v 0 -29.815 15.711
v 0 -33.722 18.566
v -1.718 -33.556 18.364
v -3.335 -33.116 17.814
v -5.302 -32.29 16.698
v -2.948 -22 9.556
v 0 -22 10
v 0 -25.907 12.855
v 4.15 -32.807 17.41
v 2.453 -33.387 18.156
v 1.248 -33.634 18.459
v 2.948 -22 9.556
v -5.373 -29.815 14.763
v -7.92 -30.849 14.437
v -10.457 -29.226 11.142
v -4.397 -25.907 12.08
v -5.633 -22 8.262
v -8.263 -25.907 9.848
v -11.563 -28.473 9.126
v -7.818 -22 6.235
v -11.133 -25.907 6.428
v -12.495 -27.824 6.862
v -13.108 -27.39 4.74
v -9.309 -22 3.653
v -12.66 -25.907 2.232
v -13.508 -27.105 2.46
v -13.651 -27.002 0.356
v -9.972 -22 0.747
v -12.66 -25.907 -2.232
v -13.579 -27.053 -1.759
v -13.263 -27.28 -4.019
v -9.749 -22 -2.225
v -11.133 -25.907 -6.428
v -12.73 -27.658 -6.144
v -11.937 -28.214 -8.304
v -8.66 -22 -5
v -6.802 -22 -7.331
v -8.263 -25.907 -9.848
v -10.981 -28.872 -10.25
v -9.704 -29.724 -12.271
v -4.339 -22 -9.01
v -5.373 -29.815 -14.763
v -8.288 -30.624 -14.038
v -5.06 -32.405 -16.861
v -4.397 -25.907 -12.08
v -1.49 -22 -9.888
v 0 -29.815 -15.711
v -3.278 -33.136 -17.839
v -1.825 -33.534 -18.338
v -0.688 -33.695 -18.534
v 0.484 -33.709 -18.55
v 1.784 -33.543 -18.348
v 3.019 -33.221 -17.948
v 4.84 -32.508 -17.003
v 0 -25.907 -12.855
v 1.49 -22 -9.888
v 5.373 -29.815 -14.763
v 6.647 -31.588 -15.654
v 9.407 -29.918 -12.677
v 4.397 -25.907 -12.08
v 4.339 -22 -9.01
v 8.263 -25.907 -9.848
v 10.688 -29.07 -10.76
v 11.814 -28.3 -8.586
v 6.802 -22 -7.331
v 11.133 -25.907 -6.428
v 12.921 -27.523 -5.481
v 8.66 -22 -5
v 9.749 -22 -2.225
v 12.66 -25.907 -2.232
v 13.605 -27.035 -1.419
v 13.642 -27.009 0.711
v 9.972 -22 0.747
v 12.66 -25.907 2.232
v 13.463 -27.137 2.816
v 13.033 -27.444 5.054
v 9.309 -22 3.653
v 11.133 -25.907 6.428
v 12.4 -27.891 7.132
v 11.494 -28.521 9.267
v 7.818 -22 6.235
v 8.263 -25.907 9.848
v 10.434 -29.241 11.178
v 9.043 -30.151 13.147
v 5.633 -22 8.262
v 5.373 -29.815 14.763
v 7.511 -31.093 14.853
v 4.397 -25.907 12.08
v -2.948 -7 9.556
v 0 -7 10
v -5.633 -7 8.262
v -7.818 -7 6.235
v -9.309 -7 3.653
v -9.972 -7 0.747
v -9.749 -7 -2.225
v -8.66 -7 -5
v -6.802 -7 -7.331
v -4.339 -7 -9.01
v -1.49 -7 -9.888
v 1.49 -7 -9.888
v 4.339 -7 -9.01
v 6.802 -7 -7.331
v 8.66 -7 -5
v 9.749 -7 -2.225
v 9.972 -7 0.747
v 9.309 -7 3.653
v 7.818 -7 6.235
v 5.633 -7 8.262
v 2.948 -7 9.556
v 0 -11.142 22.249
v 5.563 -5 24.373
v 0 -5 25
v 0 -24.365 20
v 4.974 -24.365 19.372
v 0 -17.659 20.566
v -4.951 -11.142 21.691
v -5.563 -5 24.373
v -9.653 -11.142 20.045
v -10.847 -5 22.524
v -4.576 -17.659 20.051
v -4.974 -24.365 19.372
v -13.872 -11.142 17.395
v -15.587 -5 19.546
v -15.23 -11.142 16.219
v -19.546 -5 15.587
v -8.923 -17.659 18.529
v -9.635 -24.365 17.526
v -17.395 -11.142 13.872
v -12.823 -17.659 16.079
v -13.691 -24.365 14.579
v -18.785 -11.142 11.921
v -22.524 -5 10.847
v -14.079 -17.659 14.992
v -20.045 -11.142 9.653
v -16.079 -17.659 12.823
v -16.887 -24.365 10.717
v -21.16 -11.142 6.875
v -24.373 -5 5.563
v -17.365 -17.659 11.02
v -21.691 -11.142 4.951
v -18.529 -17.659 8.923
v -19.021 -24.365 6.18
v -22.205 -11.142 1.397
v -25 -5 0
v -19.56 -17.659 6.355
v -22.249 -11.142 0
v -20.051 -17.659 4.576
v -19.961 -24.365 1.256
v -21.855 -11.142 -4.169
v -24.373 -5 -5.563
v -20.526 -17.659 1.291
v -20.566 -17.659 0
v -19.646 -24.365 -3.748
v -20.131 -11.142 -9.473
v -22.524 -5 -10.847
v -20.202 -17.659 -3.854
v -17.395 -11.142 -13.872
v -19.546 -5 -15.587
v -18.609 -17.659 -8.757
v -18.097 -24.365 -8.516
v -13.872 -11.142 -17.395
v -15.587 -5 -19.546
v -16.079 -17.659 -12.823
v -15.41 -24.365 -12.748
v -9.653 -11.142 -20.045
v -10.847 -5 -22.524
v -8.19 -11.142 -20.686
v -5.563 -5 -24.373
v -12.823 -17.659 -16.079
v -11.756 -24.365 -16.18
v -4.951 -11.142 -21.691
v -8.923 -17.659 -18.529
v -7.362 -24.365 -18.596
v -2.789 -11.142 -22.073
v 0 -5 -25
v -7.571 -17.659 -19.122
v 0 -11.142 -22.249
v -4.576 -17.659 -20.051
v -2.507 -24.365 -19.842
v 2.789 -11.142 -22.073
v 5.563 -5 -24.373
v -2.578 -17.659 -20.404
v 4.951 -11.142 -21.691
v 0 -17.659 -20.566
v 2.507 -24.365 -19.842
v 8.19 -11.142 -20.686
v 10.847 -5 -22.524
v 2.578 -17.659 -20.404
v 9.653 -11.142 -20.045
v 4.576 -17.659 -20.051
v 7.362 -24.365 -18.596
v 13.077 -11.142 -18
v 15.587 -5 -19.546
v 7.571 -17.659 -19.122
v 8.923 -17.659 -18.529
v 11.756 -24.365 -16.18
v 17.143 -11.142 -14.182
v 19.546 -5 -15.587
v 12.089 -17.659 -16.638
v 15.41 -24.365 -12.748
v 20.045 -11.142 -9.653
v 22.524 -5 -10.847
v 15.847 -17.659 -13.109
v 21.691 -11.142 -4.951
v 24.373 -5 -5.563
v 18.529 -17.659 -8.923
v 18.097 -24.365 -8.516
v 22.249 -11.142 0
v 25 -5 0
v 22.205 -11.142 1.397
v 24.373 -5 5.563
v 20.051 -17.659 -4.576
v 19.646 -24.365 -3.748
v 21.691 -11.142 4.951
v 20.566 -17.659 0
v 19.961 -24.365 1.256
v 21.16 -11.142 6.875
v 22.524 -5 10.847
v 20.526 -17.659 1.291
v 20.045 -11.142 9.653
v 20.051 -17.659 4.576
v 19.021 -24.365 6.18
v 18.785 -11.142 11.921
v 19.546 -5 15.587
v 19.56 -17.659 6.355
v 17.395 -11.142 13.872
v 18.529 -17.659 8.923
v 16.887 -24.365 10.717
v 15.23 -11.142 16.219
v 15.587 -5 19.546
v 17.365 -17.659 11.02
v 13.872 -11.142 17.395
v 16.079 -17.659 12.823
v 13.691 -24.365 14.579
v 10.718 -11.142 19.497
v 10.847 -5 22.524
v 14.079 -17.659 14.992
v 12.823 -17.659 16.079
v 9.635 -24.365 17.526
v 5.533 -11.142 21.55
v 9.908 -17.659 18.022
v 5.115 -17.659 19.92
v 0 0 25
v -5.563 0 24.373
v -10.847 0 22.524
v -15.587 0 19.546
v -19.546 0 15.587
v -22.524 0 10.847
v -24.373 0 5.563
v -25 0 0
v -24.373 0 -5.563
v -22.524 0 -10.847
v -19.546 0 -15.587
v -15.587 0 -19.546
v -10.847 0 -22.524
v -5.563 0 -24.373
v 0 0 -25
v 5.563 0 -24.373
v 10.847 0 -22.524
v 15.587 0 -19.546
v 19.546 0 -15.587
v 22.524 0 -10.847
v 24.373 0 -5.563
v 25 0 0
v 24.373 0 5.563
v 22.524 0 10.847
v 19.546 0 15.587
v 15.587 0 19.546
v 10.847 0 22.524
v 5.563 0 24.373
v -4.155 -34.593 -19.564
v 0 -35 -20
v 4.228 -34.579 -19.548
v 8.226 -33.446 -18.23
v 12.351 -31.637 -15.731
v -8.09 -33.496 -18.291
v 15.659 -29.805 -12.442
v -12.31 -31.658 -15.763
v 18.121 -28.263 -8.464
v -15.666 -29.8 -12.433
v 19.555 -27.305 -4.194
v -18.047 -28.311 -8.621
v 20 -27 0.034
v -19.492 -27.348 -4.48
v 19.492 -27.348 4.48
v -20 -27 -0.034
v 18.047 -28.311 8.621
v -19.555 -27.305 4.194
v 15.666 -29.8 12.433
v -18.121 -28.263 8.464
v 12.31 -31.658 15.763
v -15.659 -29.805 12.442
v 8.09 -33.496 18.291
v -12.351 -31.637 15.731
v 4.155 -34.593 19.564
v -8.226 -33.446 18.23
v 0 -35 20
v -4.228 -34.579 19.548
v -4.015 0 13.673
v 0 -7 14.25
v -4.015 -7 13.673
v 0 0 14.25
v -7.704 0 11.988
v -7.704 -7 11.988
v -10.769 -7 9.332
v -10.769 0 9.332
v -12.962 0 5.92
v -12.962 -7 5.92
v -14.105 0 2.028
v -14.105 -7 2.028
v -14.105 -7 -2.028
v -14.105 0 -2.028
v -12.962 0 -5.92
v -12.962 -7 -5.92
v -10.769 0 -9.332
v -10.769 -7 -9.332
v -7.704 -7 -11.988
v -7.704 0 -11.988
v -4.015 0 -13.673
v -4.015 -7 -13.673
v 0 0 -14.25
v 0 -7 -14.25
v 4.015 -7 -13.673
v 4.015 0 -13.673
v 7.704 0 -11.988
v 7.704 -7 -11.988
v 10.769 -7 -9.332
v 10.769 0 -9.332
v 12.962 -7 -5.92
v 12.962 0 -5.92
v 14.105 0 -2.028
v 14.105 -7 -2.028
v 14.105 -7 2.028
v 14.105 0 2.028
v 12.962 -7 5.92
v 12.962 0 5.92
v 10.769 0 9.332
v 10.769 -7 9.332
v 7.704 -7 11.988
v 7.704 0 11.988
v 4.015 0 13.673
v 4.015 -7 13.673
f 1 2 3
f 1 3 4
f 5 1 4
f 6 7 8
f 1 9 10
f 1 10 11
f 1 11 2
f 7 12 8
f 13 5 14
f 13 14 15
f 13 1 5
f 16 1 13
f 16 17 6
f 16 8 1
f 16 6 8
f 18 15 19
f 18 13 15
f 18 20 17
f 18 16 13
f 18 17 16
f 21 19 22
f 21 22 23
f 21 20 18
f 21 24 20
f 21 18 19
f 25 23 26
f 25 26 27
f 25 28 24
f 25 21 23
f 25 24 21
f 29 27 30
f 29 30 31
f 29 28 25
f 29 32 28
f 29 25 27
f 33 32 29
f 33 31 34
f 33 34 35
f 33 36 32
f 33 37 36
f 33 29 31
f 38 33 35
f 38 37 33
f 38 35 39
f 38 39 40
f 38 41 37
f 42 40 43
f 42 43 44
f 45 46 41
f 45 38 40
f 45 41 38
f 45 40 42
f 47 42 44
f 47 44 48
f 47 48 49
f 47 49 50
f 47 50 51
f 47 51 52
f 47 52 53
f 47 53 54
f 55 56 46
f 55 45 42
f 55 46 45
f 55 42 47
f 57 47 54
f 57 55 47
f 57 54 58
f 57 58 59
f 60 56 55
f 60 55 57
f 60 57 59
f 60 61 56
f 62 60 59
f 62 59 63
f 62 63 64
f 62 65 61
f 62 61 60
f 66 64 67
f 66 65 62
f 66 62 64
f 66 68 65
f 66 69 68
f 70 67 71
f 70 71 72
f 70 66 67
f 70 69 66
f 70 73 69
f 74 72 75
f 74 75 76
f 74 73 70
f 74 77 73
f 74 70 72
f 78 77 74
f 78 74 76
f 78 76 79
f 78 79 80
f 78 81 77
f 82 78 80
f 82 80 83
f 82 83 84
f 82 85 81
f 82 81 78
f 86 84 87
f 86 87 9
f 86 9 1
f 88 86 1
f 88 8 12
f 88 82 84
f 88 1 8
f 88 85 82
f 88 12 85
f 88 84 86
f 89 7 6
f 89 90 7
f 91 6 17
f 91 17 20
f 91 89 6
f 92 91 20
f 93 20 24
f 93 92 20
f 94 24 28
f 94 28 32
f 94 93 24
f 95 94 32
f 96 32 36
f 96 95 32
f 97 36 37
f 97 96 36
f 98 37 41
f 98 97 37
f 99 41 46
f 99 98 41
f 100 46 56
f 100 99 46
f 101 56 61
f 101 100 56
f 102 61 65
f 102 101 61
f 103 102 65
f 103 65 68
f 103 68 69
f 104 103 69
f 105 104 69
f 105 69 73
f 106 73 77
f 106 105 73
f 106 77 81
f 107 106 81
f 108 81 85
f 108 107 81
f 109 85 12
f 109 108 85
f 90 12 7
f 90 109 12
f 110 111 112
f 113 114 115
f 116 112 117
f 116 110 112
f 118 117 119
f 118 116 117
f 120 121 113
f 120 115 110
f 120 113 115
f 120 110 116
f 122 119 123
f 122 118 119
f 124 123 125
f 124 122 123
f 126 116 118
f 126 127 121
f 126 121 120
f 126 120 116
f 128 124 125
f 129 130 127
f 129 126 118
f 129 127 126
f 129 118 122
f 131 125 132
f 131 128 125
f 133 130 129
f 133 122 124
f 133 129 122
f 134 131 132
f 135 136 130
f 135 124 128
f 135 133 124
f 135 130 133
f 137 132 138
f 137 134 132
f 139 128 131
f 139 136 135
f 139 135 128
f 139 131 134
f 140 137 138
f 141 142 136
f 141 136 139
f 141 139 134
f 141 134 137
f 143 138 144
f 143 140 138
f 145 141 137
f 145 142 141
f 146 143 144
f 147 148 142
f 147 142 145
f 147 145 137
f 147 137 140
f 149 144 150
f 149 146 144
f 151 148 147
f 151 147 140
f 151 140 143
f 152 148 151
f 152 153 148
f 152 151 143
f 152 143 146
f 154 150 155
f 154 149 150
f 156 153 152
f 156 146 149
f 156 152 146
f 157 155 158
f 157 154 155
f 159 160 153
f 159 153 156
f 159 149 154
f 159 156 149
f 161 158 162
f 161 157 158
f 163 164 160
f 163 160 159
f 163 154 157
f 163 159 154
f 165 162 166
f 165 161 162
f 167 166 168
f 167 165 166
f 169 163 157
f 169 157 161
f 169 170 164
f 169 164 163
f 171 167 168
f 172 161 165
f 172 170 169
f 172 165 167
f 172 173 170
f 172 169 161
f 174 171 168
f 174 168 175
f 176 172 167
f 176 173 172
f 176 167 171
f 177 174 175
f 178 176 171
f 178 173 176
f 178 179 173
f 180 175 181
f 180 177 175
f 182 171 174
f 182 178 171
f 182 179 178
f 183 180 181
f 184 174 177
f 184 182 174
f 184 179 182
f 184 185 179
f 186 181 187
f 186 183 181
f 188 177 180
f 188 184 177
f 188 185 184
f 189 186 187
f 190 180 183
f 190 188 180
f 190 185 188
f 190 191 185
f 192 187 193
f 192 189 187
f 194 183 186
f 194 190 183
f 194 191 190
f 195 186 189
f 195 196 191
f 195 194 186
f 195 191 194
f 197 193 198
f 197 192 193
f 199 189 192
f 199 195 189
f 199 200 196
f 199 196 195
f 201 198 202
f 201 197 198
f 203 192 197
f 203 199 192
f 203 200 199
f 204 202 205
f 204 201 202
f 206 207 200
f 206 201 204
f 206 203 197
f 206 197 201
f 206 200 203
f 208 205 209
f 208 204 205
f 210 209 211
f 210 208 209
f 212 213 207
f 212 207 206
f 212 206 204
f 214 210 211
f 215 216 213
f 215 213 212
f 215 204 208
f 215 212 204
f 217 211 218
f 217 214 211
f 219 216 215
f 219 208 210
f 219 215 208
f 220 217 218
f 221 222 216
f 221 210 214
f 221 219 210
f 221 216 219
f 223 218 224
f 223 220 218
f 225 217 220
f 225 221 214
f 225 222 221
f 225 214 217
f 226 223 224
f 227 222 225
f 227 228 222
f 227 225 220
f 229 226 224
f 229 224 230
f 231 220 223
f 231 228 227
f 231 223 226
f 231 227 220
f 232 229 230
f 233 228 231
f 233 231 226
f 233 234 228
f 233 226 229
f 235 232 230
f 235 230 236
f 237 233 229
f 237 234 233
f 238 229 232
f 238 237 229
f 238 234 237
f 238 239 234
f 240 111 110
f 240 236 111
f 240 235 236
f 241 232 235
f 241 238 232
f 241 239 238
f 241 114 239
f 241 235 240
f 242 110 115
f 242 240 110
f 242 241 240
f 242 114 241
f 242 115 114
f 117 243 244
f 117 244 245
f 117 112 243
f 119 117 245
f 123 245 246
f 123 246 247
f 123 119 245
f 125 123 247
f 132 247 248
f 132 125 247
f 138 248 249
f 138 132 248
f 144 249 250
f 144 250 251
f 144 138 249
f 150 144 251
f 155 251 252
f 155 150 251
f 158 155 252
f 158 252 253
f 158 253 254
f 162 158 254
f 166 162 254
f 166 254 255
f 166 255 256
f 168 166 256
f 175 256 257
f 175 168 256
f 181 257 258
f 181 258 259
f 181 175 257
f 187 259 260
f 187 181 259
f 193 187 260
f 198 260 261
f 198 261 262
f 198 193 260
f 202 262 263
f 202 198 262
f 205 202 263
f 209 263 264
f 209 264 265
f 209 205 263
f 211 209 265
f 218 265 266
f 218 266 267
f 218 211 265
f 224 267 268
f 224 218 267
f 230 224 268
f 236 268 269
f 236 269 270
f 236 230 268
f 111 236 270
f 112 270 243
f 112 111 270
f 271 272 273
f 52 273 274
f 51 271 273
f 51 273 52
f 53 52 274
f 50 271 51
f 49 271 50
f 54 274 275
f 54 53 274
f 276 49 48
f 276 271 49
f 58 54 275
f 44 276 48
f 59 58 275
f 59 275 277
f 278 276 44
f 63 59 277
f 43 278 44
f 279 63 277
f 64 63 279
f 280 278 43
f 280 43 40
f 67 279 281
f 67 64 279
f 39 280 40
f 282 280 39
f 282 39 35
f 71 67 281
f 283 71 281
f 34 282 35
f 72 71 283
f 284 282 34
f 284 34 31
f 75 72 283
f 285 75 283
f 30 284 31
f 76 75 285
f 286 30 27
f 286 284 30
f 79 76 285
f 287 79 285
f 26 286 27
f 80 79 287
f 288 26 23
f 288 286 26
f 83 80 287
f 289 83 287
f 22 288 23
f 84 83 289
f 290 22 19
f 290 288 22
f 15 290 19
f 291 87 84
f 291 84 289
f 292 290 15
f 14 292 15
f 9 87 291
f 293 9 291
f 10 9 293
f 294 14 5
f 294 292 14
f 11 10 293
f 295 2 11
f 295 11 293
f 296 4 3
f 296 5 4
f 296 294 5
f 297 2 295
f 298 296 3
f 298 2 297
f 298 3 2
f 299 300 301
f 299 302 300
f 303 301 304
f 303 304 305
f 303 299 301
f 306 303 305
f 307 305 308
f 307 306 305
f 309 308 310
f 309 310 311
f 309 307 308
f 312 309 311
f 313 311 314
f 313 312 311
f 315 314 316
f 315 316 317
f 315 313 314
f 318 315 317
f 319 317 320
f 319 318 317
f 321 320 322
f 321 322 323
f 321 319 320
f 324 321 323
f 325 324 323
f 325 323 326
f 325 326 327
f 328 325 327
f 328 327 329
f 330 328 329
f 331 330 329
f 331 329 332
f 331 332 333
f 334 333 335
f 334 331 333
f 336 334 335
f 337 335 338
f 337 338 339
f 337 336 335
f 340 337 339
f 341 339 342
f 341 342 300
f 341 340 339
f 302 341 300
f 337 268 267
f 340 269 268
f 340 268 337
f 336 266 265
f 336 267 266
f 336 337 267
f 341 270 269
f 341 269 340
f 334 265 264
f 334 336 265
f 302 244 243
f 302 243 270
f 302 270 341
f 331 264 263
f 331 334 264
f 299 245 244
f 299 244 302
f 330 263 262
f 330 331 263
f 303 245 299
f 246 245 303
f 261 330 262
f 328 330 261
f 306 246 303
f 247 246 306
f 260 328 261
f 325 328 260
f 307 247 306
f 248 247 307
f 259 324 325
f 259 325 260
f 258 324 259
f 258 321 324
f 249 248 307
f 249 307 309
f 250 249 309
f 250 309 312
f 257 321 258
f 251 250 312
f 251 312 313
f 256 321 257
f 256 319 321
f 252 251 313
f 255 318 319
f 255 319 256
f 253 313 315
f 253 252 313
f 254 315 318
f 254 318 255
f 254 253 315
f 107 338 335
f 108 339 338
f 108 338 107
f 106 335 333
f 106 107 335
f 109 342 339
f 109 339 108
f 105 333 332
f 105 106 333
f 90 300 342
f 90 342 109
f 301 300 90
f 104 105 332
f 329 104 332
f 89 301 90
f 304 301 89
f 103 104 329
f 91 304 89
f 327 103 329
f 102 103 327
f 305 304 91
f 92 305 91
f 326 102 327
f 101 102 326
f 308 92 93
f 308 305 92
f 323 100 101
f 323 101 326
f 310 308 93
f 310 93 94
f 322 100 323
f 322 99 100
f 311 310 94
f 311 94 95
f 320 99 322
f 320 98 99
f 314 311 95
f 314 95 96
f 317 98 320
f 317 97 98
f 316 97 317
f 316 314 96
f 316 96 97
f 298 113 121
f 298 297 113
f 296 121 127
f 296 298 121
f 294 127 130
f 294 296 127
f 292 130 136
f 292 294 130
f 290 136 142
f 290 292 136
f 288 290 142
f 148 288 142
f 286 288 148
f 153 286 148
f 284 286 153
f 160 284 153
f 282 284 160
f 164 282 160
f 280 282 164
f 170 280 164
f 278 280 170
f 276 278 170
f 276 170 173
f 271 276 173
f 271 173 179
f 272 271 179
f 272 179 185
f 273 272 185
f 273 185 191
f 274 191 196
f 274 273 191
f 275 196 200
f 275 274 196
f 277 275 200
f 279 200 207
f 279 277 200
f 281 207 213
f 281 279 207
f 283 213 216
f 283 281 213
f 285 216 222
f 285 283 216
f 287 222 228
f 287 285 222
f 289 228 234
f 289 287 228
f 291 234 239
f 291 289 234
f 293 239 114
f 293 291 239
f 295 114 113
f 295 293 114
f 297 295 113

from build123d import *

# Parameters (mm, degrees)
ENL_V_MAT_EXTRU_1_DEPTH      = 26
ENL_V_MAT_EXTRU_1_DEPTH_BACK = 26


with BuildPart() as part:
    # Esquisse1 → Révolution1 (revolve)
    with BuildSketch(Plane.XY, mode=Mode.PRIVATE) as r_volution1_sk:
        with BuildLine():
            Line((10, -22), (10, -7))
            Line((10, -7), (14.25, -7))
            Line((14.25, -7), (14.25, 0))
            Line((14.25, 0), (25, 0))
            Line((25, 0), (25, -5))
            ThreePointArc((25, -5), (21.270166538, -14.364916731), (20, -24.364916731))
            Line((20, -24.364916731), (20, -35))
            Line((20, -35), (19.5, -35))
            Line((19.5, -35), (10, -22))
        make_face()
    revolve(r_volution1_sk.sketch.rotate(Axis((0, 35.983333333, 0), (0, -1, 0)), 90), axis=Axis((0, 35.983333333, 0), (0, -1, 0)))  # turned: the seam where the file's is

    # Esquisse2 → Enlèv. mat.-Extru.1 (cut, two sides)
    with BuildSketch(Plane(origin=(0, 0, 0), x_dir=(0, 0, -1), z_dir=(1, 0, 0))) as enl_v_mat_extru_1_sk:
        with BuildLine():
            Line((109.805806645, -120.529339662), (20, -35))
            ThreePointArc((20, -35), (0, -27), (-20, -35))
            Line((-20, -35), (-109.805806645, -120.529339662))
            Line((-109.805806645, -120.529339662), (-109.805806645, -368.564424682))
            Line((-109.805806645, -368.564424682), (109.805806645, -368.564424682))
            Line((109.805806645, -368.564424682), (109.805806645, -120.529339662))
        make_face()
    extrude(amount=ENL_V_MAT_EXTRU_1_DEPTH, mode=Mode.SUBTRACT)
    extrude(enl_v_mat_extru_1_sk.sketch, amount=-ENL_V_MAT_EXTRU_1_DEPTH_BACK, mode=Mode.SUBTRACT)


solid = part.part
